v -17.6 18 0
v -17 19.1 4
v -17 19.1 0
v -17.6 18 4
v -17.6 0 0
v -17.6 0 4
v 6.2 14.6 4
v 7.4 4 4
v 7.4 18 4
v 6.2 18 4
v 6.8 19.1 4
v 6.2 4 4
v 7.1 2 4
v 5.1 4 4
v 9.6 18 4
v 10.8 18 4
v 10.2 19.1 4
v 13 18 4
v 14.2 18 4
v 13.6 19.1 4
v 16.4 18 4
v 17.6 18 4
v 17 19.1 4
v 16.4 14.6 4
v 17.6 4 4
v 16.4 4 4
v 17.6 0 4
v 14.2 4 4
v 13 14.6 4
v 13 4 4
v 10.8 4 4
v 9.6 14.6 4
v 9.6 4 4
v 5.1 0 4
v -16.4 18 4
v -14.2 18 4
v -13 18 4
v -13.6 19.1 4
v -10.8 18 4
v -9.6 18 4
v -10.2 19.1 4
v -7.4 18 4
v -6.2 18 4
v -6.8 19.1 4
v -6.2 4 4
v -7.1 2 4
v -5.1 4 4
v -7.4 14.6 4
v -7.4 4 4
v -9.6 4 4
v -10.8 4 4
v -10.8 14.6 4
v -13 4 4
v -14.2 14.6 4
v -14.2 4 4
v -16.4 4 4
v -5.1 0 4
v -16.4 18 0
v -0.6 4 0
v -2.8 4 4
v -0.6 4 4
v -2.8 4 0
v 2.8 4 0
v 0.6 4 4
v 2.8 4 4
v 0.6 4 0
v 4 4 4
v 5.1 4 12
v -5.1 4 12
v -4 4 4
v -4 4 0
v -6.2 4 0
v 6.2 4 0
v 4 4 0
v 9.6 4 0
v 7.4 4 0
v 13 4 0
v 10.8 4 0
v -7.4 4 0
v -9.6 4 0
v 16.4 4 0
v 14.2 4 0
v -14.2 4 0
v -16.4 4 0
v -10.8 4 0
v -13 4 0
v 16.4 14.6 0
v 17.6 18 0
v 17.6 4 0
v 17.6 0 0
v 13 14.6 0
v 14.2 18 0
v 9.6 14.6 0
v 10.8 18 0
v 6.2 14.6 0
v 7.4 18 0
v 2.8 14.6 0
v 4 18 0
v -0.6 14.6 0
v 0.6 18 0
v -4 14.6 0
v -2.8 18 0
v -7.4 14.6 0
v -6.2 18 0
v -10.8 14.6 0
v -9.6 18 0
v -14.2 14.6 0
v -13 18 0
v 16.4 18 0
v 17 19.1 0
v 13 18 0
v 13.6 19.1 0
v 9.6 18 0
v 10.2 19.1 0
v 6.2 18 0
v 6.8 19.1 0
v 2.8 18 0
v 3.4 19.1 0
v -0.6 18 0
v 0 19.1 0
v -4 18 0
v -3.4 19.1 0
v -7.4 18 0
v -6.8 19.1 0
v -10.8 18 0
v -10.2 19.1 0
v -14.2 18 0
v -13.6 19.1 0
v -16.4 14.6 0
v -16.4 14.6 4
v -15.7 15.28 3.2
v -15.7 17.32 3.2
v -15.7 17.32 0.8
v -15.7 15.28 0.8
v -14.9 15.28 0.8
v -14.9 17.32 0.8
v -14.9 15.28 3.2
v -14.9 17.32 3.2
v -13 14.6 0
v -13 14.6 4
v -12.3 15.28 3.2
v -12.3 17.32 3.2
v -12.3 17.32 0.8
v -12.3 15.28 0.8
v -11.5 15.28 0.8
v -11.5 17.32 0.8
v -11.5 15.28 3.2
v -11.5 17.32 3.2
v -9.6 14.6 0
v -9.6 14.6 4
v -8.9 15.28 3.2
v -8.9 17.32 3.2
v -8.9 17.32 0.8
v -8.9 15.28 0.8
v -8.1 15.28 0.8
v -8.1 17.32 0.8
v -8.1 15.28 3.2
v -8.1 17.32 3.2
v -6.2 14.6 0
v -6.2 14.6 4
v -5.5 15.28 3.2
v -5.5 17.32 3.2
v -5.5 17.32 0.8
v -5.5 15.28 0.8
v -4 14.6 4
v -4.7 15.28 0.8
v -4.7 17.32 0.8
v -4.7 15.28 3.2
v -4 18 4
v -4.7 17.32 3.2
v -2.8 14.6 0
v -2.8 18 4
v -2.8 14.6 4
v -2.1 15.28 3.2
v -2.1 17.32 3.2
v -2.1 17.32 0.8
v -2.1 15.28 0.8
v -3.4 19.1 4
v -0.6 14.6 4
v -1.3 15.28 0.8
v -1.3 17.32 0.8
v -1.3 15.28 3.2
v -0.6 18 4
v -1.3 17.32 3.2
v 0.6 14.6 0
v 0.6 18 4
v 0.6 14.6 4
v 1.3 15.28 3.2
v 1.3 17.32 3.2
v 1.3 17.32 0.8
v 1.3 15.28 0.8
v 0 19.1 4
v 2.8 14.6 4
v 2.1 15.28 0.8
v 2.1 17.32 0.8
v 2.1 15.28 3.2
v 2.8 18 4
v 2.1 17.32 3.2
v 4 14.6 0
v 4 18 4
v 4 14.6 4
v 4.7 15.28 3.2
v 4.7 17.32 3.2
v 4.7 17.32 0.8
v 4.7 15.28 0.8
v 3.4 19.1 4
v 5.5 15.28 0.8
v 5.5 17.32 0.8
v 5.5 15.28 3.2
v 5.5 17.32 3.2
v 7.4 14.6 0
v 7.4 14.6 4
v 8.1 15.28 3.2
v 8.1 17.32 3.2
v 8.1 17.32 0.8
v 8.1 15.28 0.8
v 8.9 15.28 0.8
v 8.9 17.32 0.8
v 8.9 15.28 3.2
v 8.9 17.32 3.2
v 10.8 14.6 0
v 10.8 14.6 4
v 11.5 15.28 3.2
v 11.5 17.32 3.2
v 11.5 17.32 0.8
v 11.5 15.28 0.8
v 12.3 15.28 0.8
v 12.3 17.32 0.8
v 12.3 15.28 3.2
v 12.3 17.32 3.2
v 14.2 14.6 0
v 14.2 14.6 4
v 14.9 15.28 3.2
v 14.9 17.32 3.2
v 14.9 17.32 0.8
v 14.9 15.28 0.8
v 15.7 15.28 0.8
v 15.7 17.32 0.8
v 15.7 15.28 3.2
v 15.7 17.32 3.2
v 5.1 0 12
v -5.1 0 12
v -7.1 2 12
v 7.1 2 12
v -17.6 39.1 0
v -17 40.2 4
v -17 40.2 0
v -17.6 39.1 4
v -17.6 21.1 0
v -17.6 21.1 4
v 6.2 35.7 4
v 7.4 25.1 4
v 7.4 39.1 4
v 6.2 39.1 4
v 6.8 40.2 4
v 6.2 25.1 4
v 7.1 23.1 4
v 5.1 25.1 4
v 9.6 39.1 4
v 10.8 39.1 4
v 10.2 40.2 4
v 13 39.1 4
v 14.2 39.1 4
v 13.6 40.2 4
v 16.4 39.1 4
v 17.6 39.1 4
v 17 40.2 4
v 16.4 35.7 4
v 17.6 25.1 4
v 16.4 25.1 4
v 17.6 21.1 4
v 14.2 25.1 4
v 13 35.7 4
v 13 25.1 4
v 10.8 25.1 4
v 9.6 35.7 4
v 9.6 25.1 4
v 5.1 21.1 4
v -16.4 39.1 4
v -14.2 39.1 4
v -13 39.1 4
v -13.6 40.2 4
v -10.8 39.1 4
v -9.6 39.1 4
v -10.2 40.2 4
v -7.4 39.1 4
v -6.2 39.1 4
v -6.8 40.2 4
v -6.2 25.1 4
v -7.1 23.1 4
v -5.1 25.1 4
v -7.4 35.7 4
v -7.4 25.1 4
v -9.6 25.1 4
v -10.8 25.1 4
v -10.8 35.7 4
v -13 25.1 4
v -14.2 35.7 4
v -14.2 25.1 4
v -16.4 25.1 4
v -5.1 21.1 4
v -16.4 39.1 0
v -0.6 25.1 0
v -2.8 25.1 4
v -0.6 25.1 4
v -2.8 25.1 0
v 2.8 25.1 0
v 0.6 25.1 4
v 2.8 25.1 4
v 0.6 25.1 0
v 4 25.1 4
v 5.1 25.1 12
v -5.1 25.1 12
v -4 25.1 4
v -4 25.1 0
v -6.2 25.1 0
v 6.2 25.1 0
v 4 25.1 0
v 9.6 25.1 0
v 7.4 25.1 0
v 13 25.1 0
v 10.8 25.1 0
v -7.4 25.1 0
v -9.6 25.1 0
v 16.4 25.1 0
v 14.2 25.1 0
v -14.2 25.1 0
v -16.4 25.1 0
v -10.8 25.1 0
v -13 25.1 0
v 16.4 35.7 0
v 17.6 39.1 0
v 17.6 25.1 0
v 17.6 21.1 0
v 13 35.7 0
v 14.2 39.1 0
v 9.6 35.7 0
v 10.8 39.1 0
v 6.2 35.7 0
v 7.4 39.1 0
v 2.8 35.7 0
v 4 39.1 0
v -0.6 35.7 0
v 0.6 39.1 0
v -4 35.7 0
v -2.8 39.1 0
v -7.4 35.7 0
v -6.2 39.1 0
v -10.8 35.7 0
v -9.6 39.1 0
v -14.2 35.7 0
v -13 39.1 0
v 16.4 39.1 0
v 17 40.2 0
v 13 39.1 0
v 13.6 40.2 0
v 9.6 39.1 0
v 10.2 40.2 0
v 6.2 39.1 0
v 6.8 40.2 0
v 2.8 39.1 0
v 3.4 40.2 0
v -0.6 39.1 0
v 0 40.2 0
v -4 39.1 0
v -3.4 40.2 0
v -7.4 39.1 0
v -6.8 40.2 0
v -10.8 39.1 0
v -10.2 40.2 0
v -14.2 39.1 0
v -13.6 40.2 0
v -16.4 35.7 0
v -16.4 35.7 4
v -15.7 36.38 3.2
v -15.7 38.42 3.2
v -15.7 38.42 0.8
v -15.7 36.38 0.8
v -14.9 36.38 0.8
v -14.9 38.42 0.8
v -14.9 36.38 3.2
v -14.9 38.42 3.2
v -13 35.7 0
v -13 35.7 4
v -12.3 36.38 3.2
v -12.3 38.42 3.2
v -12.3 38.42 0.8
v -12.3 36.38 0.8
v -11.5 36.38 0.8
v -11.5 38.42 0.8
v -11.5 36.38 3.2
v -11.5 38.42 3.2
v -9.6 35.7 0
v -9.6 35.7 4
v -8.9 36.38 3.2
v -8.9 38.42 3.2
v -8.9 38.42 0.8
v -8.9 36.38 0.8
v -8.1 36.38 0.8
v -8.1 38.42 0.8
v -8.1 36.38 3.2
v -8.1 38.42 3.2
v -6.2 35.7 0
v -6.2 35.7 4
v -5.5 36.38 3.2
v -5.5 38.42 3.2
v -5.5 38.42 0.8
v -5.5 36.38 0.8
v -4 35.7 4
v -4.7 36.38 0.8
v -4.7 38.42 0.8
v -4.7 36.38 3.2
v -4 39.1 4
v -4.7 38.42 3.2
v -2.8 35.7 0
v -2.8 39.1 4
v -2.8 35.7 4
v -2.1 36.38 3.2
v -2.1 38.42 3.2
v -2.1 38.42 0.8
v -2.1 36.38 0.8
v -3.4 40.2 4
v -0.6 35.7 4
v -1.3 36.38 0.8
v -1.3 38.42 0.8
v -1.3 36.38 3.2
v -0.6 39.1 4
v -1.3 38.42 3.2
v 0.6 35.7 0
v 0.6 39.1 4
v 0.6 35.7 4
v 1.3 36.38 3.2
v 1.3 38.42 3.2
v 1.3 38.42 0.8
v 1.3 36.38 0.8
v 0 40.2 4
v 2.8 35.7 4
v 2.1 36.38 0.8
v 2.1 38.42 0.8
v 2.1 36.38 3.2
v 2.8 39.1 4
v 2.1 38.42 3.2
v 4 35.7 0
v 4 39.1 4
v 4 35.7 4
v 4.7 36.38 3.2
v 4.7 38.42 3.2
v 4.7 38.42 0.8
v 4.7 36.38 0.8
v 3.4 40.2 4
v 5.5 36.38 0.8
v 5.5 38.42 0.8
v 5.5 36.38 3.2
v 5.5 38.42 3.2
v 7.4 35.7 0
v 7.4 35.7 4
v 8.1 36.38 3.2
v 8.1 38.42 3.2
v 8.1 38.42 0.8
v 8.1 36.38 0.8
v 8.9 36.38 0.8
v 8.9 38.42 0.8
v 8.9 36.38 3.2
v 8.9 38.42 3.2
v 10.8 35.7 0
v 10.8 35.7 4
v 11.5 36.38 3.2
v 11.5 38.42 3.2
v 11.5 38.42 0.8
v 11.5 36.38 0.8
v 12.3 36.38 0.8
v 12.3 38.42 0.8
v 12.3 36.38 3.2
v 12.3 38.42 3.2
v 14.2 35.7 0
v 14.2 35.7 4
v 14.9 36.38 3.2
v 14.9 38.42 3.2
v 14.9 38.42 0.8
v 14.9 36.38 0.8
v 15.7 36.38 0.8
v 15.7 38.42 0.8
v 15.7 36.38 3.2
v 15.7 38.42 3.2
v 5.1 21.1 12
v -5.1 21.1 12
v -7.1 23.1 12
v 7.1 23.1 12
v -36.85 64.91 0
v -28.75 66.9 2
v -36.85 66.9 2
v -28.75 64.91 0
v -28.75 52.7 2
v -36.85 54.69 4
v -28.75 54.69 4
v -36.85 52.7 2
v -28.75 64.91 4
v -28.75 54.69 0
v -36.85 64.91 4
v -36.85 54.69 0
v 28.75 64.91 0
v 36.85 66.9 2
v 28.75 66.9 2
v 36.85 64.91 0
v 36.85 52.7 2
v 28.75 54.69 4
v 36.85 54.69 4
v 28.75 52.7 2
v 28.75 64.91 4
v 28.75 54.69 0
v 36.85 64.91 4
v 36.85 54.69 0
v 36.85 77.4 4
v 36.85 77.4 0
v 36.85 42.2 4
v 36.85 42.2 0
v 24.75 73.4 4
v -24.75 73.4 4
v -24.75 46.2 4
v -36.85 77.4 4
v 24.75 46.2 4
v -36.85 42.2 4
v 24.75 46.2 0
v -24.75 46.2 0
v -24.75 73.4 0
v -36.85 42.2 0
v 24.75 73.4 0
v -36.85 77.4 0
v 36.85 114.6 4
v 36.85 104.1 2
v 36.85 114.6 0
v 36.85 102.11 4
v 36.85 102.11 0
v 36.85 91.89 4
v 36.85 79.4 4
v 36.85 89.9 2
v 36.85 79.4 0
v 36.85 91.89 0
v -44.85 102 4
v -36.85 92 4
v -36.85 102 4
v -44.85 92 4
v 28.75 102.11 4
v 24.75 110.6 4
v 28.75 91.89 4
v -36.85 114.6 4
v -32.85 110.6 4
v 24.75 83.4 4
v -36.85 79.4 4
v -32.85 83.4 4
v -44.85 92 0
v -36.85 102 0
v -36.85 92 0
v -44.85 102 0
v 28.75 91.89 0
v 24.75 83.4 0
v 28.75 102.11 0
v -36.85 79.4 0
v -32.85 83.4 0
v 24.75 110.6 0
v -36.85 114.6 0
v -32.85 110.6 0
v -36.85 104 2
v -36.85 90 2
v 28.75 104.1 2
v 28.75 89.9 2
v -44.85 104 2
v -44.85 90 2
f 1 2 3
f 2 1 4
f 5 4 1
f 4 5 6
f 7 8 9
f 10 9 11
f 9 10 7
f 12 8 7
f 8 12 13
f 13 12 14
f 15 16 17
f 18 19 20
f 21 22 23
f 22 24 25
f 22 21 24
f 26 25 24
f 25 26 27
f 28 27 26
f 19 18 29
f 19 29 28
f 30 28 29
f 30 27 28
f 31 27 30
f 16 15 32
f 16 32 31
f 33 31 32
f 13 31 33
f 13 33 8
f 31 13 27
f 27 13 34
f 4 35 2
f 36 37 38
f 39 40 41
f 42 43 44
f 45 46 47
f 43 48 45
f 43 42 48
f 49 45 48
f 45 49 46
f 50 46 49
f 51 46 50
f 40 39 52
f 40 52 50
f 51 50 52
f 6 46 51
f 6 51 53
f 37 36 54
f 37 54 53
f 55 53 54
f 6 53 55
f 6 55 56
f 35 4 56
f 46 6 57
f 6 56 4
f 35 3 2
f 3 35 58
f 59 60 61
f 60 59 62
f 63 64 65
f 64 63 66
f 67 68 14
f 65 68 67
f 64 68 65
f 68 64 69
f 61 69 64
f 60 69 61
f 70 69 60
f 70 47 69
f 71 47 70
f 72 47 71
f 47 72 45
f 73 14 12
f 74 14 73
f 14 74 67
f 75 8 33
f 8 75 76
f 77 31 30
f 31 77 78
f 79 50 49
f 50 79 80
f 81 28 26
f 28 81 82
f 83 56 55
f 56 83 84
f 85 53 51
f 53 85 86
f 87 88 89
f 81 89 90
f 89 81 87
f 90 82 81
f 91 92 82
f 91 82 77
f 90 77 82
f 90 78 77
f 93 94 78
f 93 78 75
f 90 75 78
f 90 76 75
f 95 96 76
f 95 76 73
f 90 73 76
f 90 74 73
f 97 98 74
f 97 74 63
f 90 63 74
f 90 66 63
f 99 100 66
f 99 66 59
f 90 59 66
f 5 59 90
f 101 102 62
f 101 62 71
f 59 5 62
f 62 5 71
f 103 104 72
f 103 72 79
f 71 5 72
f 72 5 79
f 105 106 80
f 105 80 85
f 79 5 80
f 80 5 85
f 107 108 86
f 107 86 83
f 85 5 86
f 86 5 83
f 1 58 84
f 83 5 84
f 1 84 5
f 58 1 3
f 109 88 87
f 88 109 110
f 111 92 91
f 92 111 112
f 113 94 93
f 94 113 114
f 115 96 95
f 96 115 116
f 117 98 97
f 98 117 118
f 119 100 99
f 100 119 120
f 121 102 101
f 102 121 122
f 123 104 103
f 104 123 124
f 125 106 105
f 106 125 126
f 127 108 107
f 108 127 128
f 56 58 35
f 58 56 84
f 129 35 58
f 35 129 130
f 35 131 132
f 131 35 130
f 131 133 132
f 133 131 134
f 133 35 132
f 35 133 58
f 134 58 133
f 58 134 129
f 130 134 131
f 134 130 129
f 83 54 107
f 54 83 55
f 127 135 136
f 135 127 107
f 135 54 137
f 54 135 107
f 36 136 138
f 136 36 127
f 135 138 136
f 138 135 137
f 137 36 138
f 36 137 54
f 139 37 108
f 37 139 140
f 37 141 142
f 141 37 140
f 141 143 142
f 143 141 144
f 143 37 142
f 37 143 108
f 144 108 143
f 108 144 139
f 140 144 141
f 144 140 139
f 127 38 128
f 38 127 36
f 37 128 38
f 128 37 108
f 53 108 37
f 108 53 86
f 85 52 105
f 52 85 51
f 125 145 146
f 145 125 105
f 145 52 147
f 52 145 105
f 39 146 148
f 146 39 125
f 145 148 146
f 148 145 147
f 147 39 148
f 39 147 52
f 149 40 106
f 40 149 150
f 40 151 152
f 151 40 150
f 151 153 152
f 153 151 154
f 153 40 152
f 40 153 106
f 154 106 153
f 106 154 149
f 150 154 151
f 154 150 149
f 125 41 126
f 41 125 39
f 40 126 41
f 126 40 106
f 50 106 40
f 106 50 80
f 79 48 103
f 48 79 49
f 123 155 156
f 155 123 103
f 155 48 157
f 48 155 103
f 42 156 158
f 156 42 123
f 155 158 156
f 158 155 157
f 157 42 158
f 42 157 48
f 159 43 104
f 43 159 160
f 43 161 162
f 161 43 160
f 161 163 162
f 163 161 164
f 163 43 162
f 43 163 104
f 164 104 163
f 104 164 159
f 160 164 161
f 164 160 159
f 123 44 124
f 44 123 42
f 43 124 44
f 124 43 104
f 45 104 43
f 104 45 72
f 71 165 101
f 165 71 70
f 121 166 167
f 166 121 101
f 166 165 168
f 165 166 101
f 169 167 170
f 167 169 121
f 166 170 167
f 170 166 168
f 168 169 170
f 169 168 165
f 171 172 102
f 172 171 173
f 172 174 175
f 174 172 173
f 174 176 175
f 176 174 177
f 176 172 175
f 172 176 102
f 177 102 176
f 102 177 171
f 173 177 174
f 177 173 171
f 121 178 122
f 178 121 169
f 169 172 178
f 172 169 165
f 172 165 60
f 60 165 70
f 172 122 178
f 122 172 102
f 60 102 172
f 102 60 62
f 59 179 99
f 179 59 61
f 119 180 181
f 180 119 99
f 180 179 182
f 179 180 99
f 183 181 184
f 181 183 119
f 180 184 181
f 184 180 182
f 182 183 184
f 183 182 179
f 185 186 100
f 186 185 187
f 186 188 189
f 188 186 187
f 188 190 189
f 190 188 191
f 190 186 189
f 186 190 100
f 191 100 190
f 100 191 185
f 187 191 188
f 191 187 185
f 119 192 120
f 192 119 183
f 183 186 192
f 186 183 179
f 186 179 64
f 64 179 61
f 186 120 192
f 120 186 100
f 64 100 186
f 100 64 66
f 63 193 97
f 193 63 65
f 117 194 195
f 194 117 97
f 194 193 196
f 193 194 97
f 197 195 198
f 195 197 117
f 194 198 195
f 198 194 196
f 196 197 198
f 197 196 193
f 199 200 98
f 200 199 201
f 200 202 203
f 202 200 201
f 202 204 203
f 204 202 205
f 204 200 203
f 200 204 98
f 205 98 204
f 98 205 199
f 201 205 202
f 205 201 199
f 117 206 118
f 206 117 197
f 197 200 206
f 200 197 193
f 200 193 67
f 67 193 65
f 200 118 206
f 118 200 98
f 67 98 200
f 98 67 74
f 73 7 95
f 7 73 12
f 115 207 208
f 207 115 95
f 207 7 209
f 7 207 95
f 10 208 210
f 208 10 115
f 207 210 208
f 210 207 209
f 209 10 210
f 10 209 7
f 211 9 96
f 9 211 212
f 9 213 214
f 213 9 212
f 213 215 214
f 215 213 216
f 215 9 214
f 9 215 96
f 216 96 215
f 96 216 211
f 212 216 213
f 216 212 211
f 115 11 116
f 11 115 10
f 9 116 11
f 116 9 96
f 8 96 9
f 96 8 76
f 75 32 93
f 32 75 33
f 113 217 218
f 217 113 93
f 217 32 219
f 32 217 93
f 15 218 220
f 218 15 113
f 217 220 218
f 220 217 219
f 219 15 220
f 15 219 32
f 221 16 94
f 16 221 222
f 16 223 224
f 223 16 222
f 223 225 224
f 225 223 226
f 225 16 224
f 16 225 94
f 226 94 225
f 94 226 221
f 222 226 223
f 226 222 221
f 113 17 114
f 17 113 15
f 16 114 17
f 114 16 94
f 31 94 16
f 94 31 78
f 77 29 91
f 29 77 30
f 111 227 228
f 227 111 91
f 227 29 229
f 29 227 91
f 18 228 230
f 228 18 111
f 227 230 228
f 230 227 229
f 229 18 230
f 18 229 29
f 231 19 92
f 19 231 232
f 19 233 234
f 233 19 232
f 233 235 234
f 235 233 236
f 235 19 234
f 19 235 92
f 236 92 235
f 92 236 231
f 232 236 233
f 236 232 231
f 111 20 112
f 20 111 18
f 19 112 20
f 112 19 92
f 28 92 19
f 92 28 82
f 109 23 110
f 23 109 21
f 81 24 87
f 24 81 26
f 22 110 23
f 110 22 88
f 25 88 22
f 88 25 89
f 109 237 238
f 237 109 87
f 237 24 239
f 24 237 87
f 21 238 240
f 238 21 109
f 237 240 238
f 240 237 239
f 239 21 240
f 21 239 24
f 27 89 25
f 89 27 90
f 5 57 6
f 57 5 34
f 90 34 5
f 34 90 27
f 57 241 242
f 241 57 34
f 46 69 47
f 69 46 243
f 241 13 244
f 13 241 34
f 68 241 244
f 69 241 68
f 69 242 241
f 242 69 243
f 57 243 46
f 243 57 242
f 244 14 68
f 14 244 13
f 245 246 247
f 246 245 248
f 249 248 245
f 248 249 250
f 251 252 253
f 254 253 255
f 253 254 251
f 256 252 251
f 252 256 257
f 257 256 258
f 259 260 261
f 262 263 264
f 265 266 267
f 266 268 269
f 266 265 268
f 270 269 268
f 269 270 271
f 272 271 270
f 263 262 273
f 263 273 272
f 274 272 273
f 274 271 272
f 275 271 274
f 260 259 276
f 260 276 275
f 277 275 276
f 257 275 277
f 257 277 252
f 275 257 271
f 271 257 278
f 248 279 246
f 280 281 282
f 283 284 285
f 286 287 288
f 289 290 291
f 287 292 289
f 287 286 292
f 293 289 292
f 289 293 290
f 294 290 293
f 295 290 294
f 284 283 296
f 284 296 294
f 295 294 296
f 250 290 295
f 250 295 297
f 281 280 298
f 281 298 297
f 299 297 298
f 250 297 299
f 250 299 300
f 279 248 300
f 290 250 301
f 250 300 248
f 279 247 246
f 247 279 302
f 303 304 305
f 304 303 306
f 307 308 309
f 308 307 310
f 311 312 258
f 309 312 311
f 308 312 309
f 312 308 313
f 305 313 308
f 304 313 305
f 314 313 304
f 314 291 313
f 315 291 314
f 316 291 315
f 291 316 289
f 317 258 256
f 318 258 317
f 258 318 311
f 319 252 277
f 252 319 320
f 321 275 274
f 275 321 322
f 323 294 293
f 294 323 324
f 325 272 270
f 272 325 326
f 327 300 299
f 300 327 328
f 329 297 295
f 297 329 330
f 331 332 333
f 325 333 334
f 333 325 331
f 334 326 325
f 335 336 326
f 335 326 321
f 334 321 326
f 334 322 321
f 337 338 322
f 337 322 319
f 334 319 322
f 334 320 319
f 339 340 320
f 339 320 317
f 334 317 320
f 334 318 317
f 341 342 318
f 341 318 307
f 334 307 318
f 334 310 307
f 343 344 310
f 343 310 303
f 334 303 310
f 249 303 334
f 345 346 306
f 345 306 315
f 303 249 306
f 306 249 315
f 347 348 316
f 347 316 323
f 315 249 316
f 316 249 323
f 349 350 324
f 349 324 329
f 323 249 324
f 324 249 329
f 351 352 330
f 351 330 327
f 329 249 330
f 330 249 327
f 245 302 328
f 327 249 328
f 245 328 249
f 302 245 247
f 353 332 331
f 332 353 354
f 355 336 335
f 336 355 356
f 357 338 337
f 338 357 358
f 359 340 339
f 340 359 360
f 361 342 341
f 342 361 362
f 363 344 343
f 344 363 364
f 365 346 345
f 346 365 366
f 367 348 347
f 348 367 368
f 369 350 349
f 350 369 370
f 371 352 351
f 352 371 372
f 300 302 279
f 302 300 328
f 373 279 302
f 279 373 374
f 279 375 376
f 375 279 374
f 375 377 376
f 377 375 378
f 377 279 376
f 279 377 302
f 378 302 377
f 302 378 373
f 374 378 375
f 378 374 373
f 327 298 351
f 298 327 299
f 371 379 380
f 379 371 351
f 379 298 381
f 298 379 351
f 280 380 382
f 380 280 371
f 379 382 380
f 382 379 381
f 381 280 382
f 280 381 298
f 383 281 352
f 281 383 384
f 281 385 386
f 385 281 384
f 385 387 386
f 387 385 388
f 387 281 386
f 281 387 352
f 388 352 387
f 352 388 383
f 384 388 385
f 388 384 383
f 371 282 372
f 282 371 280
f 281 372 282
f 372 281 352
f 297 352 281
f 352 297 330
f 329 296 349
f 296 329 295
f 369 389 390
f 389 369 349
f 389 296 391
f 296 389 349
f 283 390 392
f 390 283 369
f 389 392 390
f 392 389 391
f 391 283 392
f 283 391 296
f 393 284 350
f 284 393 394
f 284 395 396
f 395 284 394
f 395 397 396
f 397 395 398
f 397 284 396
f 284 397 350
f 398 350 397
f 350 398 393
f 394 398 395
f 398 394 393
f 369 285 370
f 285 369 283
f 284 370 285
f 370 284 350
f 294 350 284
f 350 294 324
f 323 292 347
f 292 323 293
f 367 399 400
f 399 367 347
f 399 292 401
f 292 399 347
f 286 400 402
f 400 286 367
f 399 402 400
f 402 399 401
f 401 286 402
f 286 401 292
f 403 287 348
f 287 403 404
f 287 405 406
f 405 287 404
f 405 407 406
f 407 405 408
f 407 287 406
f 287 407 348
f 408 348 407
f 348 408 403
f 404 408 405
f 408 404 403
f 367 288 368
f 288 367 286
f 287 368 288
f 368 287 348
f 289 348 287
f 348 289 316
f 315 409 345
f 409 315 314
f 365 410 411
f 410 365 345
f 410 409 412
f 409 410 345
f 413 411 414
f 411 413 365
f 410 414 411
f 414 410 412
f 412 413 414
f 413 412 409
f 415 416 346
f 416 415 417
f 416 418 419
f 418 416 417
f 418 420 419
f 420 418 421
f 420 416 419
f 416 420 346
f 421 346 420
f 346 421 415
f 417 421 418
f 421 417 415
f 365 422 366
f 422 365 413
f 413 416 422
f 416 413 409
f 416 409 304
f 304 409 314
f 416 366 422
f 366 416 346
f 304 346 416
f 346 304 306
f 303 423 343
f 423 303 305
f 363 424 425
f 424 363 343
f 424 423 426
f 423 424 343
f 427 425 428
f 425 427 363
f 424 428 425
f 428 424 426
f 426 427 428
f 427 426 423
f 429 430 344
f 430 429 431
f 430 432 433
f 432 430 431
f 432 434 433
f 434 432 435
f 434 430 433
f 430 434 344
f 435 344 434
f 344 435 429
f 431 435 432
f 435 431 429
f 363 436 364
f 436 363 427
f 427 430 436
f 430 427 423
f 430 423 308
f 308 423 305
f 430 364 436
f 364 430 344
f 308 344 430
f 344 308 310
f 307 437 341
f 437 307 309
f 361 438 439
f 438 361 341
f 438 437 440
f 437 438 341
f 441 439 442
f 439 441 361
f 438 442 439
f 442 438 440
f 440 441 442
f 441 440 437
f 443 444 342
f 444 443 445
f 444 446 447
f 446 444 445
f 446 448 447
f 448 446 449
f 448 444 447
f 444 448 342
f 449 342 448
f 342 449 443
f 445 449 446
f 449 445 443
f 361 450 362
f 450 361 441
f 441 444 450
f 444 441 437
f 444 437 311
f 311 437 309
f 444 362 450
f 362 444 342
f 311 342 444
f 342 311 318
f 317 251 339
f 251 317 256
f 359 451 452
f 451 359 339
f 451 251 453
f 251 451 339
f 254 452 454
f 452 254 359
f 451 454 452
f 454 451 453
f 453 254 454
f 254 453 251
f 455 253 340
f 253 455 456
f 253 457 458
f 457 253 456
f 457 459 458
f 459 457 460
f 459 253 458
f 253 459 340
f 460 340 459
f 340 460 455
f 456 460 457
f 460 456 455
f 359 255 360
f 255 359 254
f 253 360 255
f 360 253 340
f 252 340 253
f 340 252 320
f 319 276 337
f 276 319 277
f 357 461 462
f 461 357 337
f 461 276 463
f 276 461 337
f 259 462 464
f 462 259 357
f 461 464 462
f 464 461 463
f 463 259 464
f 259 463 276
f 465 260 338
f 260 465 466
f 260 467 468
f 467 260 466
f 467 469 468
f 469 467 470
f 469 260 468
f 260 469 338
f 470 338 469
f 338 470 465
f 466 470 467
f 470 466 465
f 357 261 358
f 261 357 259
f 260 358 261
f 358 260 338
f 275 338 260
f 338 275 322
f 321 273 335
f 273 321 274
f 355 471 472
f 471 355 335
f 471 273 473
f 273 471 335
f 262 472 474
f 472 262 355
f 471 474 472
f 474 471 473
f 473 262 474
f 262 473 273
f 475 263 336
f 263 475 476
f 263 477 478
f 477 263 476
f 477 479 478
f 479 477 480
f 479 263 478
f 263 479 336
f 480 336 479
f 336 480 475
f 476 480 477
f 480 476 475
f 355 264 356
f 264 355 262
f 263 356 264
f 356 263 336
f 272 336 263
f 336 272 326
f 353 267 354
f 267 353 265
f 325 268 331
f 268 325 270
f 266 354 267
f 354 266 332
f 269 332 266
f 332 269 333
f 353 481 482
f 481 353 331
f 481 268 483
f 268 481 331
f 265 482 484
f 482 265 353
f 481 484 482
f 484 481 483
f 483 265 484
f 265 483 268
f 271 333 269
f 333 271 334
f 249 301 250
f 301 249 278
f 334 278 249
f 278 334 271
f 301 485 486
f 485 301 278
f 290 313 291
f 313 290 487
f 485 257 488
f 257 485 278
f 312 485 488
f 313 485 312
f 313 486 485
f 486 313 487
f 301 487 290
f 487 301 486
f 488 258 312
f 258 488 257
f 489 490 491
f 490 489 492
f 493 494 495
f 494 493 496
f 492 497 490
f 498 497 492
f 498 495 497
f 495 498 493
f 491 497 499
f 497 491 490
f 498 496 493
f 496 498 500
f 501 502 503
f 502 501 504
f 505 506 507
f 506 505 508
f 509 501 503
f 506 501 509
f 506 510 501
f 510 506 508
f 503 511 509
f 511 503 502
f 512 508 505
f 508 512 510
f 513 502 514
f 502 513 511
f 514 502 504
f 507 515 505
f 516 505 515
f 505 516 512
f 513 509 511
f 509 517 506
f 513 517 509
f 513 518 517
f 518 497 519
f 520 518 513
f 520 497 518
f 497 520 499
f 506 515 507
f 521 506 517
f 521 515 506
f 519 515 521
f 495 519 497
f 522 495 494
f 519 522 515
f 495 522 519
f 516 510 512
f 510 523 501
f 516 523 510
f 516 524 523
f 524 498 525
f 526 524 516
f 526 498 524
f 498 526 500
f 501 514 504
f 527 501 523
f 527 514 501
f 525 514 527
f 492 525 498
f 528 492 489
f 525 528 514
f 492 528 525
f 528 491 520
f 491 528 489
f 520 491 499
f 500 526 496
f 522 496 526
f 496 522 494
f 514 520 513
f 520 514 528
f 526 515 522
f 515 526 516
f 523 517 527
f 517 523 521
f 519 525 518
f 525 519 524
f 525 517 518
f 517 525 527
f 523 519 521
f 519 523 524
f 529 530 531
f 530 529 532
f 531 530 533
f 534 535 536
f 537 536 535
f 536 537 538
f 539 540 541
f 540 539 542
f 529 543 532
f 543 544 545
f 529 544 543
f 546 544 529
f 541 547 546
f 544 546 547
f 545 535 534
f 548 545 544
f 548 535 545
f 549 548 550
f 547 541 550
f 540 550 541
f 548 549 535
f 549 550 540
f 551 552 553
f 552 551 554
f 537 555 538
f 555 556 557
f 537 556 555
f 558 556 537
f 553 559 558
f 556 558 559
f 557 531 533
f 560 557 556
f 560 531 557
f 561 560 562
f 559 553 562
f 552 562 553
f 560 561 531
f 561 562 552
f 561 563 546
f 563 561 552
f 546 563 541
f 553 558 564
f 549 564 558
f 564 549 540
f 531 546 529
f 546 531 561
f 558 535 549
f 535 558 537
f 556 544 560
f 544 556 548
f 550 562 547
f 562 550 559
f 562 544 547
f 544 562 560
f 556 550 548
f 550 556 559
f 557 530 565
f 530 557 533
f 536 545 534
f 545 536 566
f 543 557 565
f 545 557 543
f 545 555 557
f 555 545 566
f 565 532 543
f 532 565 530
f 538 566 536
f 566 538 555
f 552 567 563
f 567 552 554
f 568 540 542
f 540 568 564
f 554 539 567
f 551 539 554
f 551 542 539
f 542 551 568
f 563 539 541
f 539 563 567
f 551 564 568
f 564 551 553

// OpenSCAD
include <MCAD/units.scad>

/* [Common] */

// Part to draw
part = "plate"; // [comb:Comb Only,bridge:Bridge Only,plate:Build Plate]
// Bridge segment to draw
bridgeSegment = -1; // [-1:All segments,0:First segment,1:Second segment, 2:Third segment, 3:Fourth segment]
// Length of the cables, excluding header connectors
cableLength = 156;
// Number of cable slots
numCables = 10;
// Number of bridge segment splits
numBridgeSegments = 2;
// Space between parts on the built plate
itemSpacing = 2;

/* [Comb] */

// Thickness of the comb part
combThickness = 4;
// Width of the comb part and thickness of the bridge part
combBaseWidth = 4;
// Length of a tooth
combToothLength = 14;
// Width of a tooth
combToothWidth = 1.2;
// Length of the top part of a tooth
combSharpLength = 1.1;
// Length of the bump part of a tooth
toothBumpLength = 3.4;
// Thickness of the bump part of a tooth
toothBumpThickness = 0.7;
// Space between teeth
combToothSpacing = 2.2;

/* [Bridge] */

// Width of the bridge part
bridgeWidth = 35.2;
// Margin between the outer bridge border and the center hole
bridgeHoleMargin = 4;

/* [Join] */

// Length to subtract from the total bridge length per join (to compensate for imperfect fits)
joinSubtractLength = 0.2;
// Width of the joining hole
joinHoleWidth = 10.2;
// Length (depth) of the joining hole
joinHoleLength = 8.1;
// Width of the joining peg on the comb (printed vertically)
joinCombPegWidth = 10.2;
// Width of the joining peg on the bridge (printed horizontally)
joinBridgePegWidth = 10;
// Length of the joining peg
joinPegLength = 8;

/* [Hidden] */

combLength = (numCables + 1) * combToothWidth + numCables * combToothSpacing;
combSpacing = combBaseWidth + combToothLength + combSharpLength + itemSpacing;
bridgeLength = (cableLength - combThickness * 2 - (1 + numBridgeSegments) * joinSubtractLength) / numBridgeSegments;
bridgeSpacing = bridgeWidth + itemSpacing;

$fn = 60;

module CombTooth(bumps = [0,1]) {
    linear_extrude(combThickness)
    polygon([
        [0, 0], 
        [0, combToothLength],
        [combToothWidth / 2, combToothLength + combSharpLength],
        [combToothWidth, combToothLength],
        [combToothWidth, 0],
    ]);
    
    for (x = bumps) 
        mirror([x, 0, 0])
        translate([-combToothWidth * x, combToothLength - toothBumpLength / 2, combThickness / 2])
        rotate([-90, 0, 90])
        linear_extrude(toothBumpThickness, scale = 0.6)
        square([toothBumpLength, combThickness], center = true);
}

module DupontComb() {
    translate([-combLength / 2, 0, 0]) {
        cube([combLength, combBaseWidth, combThickness]);

        translate([combLength / 2, combBaseWidth / 2, combThickness - epsilon])
        linear_extrude(joinPegLength + epsilon)
        polygon([
            [-joinCombPegWidth / 2, -combBaseWidth / 2], 
            [joinCombPegWidth / 2, -combBaseWidth / 2],
            [joinCombPegWidth / 2 + combBaseWidth / 2, 0],
            [joinCombPegWidth / 2, combBaseWidth / 2], 
            [-joinCombPegWidth / 2, combBaseWidth / 2], 
            [-joinCombPegWidth / 2 - combBaseWidth / 2, 0],
        ]);

        for (t = [0:numCables])
            translate([t * (combToothWidth + combToothSpacing), combBaseWidth, 0])
            CombTooth(t == 0 ? [1] : t == numCables ? [0] : [0, 1]);
    }
}

module DupontBridge() {
    for (i = [0:numBridgeSegments - 1])
        if (bridgeSegment == -1 || bridgeSegment == i)
            translate([-bridgeLength / 2, i * bridgeSpacing, 0]) {
                difference() {
                    cube([bridgeLength, bridgeWidth, combBaseWidth]);
                    
                    translate([bridgeHoleMargin + (i > 0 ? 0 : joinHoleLength), bridgeHoleMargin, -epsilon])
                    cube([bridgeLength - joinHoleLength * (i > 0 ? 1 : 2) - bridgeHoleMargin * 2, 
                        bridgeWidth - bridgeHoleMargin * 2, combBaseWidth + epsilon * 2]);
                    
                    l = bridgeLength - joinHoleLength;
                    for (x = i == 0 ? [-epsilon, l] : [l])
                        translate([x, bridgeWidth / 2, combBaseWidth / 2])
                        rotate([-90, 0, -90])
                        linear_extrude(joinHoleLength + epsilon)
                        polygon([
                            [-joinHoleWidth / 2, -combBaseWidth / 2 - epsilon], 
                            [joinHoleWidth / 2, -combBaseWidth / 2 - epsilon],
                            [joinHoleWidth / 2 + combBaseWidth / 2, 0],
                            [joinHoleWidth / 2, combBaseWidth / 2 + epsilon], 
                            [-joinHoleWidth / 2, combBaseWidth / 2 + epsilon], 
                            [-joinHoleWidth / 2 - combBaseWidth / 2, 0],
                        ]);
                }
            
                if (i > 0)
                    translate([-joinPegLength, bridgeWidth / 2, combBaseWidth / 2])
                    rotate([-90, 0, -90])
                    linear_extrude(joinPegLength + epsilon)
                    polygon([
                        [-joinBridgePegWidth / 2, -combBaseWidth / 2], 
                        [joinBridgePegWidth / 2, -combBaseWidth / 2],
                        [joinBridgePegWidth / 2 + combBaseWidth / 2, 0],
                        [joinBridgePegWidth / 2, combBaseWidth / 2], 
                        [-joinBridgePegWidth / 2, combBaseWidth / 2], 
                        [-joinBridgePegWidth / 2 - combBaseWidth / 2, 0],
                    ]);
            }    
}

module DupontOrganizerPlate() {
    DupontComb();

    translate([0, combSpacing, 0])
    DupontComb();
    
    translate([0, combSpacing * 2, 0])
    DupontBridge();
}

if (part == "comb")
    DupontComb();

if (part == "bridge")
    DupontBridge();

if (part == "plate")
    DupontOrganizerPlate();
